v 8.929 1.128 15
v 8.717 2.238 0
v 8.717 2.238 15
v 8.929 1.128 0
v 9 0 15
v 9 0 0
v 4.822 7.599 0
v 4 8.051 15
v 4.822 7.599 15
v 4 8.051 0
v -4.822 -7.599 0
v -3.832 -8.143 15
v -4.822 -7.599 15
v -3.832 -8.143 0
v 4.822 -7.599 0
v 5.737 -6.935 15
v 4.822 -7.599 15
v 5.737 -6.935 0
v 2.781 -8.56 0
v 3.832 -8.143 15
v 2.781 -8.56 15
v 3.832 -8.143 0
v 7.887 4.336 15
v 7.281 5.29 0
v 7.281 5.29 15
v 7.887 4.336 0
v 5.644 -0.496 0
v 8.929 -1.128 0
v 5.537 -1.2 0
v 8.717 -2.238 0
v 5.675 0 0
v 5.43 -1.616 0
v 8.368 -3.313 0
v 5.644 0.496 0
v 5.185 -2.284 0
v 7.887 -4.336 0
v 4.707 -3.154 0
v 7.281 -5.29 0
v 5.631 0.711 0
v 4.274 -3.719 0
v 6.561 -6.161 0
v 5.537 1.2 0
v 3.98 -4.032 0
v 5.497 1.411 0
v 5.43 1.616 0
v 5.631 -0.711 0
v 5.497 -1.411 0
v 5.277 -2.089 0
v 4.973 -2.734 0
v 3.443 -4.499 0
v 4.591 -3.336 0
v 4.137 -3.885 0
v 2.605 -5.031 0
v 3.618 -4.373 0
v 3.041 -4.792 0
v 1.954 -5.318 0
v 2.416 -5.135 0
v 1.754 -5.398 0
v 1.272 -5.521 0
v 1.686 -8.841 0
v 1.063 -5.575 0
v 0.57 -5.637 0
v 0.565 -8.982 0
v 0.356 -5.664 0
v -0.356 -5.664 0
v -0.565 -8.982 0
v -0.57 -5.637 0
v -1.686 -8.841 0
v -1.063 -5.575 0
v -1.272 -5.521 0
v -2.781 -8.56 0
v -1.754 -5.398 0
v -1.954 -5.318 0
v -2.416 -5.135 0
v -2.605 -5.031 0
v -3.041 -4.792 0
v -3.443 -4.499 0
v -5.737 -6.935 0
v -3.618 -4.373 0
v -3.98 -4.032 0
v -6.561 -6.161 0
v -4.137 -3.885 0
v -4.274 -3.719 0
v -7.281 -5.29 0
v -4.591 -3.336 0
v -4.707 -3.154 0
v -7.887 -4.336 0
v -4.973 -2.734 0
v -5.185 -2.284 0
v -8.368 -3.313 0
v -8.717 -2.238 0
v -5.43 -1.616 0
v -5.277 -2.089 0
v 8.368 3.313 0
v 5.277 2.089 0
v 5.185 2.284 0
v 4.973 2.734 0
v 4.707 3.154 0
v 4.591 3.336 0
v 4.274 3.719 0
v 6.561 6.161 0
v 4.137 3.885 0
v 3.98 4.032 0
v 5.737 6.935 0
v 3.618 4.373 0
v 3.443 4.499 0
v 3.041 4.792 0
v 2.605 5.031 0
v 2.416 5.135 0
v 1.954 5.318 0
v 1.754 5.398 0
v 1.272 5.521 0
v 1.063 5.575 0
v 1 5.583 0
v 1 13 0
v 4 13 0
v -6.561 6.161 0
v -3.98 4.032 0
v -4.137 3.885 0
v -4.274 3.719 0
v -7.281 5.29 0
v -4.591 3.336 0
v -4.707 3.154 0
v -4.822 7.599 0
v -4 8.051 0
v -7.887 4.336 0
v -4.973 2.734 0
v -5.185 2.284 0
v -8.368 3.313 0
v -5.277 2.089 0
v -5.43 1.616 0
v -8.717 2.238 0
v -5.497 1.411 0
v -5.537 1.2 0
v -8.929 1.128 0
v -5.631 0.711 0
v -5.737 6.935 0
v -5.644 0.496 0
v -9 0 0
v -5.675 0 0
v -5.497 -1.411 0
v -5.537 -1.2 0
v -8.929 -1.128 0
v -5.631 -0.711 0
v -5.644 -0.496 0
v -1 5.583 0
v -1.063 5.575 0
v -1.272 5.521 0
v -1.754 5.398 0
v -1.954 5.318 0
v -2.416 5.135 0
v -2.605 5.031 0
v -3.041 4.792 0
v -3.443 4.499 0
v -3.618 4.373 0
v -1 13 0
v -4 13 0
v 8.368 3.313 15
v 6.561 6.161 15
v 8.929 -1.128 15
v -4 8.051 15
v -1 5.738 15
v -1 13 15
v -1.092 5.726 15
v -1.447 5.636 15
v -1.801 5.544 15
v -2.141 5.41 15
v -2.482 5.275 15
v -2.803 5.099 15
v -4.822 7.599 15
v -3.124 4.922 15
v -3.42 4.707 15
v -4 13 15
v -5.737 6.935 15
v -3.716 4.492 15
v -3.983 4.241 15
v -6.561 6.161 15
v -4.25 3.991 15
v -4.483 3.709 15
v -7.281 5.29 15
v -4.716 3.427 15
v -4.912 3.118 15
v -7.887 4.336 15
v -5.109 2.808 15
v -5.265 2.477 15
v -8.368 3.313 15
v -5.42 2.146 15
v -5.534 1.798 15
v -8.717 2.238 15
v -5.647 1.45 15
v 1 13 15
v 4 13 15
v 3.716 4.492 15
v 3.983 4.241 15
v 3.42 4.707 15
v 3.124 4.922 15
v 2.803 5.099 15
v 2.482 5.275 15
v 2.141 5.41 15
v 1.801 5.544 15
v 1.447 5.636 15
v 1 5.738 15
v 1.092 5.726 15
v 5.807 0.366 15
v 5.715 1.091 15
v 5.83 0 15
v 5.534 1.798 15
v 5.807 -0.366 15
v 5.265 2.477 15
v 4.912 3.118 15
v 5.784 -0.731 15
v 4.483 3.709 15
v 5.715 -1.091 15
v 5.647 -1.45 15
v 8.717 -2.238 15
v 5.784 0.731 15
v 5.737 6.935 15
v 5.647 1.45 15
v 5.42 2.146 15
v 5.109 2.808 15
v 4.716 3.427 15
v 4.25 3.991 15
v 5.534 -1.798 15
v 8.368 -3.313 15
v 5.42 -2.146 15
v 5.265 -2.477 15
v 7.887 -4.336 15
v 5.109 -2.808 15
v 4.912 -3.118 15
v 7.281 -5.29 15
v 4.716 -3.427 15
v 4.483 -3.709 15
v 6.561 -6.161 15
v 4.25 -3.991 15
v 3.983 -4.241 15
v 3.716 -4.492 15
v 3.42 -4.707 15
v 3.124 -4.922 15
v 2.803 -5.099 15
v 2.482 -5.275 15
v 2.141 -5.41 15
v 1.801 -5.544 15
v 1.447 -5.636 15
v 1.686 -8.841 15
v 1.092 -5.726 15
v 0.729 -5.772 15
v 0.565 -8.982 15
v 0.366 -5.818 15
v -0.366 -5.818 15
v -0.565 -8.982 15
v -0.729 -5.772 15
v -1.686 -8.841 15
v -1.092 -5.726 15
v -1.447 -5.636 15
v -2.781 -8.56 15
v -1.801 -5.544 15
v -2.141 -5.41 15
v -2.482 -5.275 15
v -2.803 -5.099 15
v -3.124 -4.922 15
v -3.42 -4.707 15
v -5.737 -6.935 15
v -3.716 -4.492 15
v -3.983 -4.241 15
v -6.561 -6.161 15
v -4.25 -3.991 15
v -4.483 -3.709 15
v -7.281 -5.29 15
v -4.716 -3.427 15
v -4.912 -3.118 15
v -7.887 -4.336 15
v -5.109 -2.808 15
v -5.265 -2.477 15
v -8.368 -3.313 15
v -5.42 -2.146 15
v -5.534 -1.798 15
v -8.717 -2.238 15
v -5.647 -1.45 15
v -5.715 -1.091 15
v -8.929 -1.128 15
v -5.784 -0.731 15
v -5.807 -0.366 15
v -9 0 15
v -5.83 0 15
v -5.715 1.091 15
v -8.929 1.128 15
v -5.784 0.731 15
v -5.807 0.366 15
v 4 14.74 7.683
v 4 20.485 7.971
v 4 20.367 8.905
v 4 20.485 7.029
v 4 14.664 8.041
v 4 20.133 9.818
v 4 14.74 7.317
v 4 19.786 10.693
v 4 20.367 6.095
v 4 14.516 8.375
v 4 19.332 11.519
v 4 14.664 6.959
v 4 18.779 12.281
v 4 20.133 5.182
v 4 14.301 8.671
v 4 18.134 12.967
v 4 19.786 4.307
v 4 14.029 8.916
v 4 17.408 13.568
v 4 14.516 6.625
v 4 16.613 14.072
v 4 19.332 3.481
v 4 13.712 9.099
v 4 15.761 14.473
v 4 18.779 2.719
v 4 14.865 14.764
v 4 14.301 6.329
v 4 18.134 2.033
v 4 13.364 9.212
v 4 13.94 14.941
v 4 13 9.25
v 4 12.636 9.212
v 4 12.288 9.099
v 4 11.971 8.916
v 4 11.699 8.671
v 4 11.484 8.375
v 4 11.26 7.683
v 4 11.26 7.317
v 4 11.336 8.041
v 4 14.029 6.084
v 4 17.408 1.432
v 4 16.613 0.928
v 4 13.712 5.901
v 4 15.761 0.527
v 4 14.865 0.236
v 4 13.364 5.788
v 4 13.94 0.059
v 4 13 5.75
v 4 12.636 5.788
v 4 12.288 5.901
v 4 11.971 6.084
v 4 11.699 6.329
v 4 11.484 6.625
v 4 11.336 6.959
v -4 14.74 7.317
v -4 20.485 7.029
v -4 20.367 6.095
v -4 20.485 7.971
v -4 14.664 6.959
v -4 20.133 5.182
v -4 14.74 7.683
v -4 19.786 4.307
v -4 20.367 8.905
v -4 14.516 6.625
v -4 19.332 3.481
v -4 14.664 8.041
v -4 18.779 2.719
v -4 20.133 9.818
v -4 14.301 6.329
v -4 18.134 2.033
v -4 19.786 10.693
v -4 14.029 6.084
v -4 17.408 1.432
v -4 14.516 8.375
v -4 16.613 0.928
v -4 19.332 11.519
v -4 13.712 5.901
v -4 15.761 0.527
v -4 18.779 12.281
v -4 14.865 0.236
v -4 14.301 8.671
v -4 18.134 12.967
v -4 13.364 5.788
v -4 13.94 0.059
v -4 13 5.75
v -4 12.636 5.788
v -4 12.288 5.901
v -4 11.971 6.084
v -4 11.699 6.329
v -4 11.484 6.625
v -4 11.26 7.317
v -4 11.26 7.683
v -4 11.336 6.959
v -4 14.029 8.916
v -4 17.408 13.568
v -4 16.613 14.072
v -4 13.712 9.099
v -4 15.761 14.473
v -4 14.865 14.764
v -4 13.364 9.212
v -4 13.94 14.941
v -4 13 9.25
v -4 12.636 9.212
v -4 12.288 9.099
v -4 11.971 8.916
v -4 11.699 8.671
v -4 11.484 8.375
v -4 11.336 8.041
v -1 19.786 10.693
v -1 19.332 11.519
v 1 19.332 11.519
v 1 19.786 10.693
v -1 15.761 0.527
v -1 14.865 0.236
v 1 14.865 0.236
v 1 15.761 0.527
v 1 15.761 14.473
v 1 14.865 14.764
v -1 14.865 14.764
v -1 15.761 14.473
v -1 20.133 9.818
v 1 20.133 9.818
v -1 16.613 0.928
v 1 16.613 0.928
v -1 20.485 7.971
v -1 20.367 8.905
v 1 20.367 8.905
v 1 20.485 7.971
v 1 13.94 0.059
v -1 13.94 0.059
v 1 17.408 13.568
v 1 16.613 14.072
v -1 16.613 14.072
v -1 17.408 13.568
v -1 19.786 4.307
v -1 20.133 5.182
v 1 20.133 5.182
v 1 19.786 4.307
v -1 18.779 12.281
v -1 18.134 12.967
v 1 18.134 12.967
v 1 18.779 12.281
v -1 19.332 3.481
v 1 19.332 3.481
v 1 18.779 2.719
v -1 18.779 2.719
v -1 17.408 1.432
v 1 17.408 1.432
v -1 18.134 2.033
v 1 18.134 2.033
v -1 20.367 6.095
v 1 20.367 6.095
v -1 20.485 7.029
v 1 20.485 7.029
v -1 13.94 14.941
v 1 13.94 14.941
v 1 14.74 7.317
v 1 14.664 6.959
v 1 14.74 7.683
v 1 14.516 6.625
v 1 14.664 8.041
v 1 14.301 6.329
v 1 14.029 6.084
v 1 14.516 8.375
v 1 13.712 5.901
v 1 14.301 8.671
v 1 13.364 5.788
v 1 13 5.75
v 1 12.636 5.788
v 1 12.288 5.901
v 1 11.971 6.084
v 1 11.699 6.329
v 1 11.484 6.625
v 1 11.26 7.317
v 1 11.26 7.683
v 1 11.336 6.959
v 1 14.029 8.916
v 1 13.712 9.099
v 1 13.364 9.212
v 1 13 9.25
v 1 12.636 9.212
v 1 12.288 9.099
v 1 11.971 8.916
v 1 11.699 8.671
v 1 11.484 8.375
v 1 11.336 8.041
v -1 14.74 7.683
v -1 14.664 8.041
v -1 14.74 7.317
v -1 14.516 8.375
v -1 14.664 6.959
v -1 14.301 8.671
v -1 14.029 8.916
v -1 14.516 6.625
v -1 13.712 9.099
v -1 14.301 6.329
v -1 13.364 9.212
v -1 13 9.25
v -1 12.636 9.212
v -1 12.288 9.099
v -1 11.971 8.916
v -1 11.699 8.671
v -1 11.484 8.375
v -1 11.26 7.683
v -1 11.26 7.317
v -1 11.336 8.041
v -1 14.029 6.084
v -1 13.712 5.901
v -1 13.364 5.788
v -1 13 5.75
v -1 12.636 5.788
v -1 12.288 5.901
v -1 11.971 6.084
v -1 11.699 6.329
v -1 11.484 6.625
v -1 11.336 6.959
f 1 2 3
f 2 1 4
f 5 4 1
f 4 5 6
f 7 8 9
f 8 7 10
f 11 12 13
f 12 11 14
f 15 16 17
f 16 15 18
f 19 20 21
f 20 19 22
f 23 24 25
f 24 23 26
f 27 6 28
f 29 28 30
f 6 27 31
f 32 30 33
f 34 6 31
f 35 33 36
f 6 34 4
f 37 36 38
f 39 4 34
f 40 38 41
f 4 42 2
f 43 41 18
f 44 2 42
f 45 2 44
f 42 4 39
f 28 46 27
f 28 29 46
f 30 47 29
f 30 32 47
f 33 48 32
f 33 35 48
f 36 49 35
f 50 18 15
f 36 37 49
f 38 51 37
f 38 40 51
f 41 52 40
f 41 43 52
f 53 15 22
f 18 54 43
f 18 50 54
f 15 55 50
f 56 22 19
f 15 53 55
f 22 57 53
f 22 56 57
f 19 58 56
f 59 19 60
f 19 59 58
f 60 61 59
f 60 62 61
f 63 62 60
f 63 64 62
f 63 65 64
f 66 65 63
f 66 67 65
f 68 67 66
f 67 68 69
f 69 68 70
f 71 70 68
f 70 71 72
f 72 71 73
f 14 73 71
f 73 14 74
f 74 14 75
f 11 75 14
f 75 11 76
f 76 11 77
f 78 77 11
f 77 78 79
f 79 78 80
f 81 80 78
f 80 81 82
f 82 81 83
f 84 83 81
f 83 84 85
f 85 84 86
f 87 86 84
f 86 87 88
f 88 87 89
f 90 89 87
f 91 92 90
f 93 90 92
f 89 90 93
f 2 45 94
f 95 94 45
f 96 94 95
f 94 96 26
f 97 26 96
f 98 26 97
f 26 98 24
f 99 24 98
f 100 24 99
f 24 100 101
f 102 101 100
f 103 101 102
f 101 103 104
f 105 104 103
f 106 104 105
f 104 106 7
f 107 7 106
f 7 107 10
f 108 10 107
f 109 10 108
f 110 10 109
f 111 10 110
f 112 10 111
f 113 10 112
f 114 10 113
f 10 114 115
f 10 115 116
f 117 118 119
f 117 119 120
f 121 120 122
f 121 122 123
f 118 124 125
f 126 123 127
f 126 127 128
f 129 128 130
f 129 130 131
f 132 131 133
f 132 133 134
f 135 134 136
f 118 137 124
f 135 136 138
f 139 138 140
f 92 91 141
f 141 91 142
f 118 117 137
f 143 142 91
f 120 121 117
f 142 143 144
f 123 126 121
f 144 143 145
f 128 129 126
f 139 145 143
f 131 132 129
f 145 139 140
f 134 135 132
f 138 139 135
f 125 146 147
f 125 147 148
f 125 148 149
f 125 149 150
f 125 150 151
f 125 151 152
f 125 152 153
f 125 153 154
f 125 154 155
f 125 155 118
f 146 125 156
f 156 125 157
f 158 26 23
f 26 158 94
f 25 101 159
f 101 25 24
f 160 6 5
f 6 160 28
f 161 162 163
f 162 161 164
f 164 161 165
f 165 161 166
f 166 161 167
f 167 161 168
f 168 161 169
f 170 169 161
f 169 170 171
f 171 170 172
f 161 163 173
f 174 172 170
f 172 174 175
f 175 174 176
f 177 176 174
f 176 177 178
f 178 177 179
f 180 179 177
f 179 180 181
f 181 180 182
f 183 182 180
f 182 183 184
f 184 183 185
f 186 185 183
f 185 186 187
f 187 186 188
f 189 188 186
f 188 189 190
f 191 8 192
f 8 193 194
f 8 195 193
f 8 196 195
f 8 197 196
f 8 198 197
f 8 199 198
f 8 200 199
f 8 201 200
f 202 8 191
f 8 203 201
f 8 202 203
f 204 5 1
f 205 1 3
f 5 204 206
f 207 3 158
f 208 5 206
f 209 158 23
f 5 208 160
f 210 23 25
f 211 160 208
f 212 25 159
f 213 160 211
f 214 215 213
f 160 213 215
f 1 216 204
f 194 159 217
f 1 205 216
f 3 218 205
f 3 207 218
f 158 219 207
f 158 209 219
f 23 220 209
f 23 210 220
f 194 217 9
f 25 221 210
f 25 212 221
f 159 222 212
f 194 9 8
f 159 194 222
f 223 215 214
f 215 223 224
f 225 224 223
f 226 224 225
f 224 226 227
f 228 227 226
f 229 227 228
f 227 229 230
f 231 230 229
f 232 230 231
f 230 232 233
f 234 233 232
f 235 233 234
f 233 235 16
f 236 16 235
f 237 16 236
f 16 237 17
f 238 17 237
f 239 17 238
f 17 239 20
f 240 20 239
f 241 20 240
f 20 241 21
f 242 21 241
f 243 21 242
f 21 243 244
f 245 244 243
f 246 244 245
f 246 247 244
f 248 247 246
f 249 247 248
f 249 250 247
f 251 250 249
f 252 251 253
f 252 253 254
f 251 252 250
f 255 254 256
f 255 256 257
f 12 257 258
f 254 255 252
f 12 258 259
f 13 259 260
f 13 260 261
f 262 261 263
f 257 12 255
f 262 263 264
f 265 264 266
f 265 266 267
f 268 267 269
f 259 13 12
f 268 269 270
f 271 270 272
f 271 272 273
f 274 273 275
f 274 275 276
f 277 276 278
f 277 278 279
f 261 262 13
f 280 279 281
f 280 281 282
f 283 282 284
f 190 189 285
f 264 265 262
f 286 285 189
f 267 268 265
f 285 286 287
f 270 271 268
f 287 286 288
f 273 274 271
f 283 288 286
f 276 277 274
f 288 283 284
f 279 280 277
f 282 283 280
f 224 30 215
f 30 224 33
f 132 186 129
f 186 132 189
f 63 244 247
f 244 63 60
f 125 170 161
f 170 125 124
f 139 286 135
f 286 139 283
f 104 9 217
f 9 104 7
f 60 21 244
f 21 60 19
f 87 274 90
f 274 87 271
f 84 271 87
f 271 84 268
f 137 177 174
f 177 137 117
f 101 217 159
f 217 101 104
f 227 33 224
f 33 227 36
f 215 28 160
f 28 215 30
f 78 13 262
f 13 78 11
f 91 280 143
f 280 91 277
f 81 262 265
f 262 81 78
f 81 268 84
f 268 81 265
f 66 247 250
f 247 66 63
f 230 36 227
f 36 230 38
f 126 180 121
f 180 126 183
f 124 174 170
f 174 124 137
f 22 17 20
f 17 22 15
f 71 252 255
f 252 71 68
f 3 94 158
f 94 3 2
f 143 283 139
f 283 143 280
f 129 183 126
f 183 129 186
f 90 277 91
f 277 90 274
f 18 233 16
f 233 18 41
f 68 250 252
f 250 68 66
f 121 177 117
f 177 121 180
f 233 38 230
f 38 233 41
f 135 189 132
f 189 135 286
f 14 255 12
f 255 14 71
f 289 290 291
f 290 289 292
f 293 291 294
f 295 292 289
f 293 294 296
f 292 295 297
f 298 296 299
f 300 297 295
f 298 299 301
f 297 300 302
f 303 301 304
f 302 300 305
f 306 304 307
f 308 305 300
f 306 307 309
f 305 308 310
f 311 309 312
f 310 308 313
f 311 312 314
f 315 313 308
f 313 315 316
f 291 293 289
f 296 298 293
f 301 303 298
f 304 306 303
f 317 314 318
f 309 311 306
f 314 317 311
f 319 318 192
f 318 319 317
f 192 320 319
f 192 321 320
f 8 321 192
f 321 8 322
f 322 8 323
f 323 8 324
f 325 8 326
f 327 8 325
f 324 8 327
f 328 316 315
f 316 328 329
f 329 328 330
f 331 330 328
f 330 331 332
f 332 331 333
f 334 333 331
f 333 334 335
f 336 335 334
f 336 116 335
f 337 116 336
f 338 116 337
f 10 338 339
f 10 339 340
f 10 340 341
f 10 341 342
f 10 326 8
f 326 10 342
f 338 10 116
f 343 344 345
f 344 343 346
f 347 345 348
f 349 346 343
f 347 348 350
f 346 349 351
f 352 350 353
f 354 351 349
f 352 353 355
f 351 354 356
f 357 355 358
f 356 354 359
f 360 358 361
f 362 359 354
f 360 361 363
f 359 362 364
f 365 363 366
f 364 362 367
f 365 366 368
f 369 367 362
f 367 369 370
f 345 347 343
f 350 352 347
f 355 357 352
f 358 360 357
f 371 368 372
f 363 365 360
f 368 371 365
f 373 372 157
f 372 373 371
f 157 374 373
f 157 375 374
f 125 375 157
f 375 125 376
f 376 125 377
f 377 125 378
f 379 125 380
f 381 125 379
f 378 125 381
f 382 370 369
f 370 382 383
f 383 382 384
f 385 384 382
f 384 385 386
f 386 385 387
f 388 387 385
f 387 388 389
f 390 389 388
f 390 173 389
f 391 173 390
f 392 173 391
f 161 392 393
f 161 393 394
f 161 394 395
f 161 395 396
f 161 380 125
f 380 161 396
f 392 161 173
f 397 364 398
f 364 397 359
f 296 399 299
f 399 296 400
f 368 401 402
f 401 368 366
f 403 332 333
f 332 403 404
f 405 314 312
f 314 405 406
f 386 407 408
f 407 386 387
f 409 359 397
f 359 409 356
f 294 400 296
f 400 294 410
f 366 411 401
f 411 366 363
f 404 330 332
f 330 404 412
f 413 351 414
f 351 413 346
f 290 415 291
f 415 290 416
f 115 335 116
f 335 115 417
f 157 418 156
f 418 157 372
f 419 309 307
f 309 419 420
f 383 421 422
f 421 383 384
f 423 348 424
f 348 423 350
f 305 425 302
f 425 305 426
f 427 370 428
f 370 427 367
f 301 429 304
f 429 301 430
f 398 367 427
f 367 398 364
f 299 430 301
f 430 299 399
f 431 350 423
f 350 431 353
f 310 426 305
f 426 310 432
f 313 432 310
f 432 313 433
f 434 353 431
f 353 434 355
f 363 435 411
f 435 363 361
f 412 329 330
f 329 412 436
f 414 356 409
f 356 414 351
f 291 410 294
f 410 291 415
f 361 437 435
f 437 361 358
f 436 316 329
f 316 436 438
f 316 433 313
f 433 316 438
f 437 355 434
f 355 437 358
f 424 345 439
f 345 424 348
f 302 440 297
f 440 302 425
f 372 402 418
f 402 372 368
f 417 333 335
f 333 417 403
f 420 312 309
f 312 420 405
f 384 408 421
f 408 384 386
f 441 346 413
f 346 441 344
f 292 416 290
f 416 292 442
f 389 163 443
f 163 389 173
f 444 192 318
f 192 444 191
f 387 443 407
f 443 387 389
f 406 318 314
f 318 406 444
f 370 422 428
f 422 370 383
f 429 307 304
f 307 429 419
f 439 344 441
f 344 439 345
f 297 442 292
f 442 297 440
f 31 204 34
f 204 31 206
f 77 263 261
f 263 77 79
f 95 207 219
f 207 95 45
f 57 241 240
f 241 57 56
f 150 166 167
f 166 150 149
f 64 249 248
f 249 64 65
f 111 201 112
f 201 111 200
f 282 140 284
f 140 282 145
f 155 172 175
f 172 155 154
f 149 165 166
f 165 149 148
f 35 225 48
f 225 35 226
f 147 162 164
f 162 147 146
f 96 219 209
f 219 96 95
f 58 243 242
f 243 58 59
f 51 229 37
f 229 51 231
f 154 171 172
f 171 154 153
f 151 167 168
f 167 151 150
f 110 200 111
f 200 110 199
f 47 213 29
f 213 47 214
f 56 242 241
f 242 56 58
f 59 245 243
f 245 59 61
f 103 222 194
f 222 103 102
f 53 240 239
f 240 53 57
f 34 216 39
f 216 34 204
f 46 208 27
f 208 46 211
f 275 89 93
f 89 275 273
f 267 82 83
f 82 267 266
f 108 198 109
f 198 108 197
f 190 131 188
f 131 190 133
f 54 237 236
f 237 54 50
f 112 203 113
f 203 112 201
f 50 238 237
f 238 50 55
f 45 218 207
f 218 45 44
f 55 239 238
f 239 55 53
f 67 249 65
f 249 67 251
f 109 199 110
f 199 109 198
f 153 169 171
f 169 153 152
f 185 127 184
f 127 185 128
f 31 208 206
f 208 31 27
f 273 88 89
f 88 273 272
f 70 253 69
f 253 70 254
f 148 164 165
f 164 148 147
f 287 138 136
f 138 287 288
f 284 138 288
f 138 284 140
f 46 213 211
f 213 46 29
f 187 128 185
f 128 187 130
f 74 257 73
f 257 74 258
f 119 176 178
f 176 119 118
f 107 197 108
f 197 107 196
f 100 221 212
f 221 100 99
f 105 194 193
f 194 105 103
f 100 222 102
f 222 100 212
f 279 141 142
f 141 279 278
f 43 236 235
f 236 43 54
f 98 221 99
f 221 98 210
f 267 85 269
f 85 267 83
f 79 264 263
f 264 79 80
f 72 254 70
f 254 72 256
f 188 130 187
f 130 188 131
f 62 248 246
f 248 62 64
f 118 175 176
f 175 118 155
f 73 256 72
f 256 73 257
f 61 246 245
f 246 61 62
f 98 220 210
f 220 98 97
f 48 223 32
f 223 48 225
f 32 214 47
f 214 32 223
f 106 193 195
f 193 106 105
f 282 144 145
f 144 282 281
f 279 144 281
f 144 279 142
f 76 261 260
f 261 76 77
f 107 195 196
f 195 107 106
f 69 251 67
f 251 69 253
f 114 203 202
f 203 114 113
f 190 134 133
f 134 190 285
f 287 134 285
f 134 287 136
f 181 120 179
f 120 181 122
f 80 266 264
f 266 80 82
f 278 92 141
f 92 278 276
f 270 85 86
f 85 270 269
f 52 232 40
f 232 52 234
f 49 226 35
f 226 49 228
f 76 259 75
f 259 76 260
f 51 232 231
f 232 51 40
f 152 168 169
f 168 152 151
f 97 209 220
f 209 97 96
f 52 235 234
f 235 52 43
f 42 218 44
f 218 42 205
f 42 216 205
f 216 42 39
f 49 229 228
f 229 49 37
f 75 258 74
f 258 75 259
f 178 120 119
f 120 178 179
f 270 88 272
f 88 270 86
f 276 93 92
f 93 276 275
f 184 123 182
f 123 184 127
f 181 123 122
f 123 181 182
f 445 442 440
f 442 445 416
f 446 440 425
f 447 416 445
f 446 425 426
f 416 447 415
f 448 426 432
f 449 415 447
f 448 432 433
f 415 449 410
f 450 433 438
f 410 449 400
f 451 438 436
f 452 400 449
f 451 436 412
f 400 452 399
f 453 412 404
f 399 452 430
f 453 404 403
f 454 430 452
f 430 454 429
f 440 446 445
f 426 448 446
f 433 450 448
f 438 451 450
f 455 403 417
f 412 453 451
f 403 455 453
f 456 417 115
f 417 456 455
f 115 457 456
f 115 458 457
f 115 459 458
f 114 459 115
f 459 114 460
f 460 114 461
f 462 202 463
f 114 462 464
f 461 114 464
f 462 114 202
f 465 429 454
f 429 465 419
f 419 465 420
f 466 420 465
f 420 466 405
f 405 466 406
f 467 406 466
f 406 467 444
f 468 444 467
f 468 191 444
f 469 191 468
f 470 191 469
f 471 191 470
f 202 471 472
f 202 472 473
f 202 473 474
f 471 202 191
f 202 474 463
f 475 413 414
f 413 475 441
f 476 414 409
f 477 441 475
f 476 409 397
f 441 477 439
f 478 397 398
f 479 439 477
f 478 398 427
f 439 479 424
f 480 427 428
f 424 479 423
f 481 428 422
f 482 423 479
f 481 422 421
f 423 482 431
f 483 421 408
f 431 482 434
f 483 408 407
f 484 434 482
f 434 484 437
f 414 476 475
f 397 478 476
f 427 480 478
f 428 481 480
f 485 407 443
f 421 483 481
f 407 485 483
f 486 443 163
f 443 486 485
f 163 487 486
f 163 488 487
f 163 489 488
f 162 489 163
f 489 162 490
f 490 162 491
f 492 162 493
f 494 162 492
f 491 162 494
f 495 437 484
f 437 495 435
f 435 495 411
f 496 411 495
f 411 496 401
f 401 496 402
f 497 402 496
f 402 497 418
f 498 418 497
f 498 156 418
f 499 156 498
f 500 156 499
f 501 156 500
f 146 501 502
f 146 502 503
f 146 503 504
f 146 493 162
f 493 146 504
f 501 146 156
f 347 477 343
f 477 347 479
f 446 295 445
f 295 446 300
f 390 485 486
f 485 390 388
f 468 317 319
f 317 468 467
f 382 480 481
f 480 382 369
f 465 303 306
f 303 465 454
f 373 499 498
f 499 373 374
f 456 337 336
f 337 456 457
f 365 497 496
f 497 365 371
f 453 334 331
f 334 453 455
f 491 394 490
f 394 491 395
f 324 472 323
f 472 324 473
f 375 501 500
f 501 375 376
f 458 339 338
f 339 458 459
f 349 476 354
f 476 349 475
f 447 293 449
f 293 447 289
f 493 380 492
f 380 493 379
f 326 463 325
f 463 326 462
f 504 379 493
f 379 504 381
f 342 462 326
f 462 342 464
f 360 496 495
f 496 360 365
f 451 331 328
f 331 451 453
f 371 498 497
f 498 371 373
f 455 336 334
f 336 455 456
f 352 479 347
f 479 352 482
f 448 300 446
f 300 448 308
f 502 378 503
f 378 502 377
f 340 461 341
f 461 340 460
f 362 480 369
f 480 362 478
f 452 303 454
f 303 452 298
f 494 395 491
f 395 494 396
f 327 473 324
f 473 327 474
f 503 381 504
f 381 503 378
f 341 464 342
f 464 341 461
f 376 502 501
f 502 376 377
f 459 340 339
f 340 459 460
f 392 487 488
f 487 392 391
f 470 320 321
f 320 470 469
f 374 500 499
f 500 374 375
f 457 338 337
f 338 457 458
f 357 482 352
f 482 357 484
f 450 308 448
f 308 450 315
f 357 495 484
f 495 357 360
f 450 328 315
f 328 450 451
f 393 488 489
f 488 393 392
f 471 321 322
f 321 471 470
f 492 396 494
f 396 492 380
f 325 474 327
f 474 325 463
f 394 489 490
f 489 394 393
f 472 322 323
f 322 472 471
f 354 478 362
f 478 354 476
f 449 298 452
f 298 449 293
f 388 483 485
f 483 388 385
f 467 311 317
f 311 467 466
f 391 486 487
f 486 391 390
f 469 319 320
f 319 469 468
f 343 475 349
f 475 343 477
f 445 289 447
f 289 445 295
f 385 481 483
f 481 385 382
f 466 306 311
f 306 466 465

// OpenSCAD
// 125 total length
// 87 handle length
$fn=50;
module sharpie(){
  h1 = 8.5;
  h2 = 78.5;
  h3 = 23;
  d1 = 5;
  d2 = 10.8;
  d3 = 12.4;
  d4 = 10.6;
  d5 = 10;
  cylinder(h=h1, d2=d2, d1=d1);
  translate([0,0,h1])cylinder(h=h2, d1=d2, d2=d3);
  color("black")translate([0,0,h1+h2])cylinder(h=h3, d1=d4, d2=d5);
  color("black")translate([0,0,h1+h2+h3])sphere(d=d5);
  color("black")translate([0,0,h1+h2+h3])cylinder(d1=5, d2=2, h=15);
}

color("yellow")difference(){
  union(){
    cylinder(d=18, h=15);
    translate([0,3,15/2])cube([8, 20, 15], center=true);
    translate([0,13,15/2])rotate([0,90,0])cylinder(h=8, d=15, center=true);
  }
  translate([0,0,-30])scale([1.01, 1.01, 1])sharpie();
  translate([0,20,0])cube([2, 40, 40], center=true);
  translate([0,13,15/2])rotate([0,90,0])cylinder(d=3.5, h=20, center=true, $fn=30);
}
